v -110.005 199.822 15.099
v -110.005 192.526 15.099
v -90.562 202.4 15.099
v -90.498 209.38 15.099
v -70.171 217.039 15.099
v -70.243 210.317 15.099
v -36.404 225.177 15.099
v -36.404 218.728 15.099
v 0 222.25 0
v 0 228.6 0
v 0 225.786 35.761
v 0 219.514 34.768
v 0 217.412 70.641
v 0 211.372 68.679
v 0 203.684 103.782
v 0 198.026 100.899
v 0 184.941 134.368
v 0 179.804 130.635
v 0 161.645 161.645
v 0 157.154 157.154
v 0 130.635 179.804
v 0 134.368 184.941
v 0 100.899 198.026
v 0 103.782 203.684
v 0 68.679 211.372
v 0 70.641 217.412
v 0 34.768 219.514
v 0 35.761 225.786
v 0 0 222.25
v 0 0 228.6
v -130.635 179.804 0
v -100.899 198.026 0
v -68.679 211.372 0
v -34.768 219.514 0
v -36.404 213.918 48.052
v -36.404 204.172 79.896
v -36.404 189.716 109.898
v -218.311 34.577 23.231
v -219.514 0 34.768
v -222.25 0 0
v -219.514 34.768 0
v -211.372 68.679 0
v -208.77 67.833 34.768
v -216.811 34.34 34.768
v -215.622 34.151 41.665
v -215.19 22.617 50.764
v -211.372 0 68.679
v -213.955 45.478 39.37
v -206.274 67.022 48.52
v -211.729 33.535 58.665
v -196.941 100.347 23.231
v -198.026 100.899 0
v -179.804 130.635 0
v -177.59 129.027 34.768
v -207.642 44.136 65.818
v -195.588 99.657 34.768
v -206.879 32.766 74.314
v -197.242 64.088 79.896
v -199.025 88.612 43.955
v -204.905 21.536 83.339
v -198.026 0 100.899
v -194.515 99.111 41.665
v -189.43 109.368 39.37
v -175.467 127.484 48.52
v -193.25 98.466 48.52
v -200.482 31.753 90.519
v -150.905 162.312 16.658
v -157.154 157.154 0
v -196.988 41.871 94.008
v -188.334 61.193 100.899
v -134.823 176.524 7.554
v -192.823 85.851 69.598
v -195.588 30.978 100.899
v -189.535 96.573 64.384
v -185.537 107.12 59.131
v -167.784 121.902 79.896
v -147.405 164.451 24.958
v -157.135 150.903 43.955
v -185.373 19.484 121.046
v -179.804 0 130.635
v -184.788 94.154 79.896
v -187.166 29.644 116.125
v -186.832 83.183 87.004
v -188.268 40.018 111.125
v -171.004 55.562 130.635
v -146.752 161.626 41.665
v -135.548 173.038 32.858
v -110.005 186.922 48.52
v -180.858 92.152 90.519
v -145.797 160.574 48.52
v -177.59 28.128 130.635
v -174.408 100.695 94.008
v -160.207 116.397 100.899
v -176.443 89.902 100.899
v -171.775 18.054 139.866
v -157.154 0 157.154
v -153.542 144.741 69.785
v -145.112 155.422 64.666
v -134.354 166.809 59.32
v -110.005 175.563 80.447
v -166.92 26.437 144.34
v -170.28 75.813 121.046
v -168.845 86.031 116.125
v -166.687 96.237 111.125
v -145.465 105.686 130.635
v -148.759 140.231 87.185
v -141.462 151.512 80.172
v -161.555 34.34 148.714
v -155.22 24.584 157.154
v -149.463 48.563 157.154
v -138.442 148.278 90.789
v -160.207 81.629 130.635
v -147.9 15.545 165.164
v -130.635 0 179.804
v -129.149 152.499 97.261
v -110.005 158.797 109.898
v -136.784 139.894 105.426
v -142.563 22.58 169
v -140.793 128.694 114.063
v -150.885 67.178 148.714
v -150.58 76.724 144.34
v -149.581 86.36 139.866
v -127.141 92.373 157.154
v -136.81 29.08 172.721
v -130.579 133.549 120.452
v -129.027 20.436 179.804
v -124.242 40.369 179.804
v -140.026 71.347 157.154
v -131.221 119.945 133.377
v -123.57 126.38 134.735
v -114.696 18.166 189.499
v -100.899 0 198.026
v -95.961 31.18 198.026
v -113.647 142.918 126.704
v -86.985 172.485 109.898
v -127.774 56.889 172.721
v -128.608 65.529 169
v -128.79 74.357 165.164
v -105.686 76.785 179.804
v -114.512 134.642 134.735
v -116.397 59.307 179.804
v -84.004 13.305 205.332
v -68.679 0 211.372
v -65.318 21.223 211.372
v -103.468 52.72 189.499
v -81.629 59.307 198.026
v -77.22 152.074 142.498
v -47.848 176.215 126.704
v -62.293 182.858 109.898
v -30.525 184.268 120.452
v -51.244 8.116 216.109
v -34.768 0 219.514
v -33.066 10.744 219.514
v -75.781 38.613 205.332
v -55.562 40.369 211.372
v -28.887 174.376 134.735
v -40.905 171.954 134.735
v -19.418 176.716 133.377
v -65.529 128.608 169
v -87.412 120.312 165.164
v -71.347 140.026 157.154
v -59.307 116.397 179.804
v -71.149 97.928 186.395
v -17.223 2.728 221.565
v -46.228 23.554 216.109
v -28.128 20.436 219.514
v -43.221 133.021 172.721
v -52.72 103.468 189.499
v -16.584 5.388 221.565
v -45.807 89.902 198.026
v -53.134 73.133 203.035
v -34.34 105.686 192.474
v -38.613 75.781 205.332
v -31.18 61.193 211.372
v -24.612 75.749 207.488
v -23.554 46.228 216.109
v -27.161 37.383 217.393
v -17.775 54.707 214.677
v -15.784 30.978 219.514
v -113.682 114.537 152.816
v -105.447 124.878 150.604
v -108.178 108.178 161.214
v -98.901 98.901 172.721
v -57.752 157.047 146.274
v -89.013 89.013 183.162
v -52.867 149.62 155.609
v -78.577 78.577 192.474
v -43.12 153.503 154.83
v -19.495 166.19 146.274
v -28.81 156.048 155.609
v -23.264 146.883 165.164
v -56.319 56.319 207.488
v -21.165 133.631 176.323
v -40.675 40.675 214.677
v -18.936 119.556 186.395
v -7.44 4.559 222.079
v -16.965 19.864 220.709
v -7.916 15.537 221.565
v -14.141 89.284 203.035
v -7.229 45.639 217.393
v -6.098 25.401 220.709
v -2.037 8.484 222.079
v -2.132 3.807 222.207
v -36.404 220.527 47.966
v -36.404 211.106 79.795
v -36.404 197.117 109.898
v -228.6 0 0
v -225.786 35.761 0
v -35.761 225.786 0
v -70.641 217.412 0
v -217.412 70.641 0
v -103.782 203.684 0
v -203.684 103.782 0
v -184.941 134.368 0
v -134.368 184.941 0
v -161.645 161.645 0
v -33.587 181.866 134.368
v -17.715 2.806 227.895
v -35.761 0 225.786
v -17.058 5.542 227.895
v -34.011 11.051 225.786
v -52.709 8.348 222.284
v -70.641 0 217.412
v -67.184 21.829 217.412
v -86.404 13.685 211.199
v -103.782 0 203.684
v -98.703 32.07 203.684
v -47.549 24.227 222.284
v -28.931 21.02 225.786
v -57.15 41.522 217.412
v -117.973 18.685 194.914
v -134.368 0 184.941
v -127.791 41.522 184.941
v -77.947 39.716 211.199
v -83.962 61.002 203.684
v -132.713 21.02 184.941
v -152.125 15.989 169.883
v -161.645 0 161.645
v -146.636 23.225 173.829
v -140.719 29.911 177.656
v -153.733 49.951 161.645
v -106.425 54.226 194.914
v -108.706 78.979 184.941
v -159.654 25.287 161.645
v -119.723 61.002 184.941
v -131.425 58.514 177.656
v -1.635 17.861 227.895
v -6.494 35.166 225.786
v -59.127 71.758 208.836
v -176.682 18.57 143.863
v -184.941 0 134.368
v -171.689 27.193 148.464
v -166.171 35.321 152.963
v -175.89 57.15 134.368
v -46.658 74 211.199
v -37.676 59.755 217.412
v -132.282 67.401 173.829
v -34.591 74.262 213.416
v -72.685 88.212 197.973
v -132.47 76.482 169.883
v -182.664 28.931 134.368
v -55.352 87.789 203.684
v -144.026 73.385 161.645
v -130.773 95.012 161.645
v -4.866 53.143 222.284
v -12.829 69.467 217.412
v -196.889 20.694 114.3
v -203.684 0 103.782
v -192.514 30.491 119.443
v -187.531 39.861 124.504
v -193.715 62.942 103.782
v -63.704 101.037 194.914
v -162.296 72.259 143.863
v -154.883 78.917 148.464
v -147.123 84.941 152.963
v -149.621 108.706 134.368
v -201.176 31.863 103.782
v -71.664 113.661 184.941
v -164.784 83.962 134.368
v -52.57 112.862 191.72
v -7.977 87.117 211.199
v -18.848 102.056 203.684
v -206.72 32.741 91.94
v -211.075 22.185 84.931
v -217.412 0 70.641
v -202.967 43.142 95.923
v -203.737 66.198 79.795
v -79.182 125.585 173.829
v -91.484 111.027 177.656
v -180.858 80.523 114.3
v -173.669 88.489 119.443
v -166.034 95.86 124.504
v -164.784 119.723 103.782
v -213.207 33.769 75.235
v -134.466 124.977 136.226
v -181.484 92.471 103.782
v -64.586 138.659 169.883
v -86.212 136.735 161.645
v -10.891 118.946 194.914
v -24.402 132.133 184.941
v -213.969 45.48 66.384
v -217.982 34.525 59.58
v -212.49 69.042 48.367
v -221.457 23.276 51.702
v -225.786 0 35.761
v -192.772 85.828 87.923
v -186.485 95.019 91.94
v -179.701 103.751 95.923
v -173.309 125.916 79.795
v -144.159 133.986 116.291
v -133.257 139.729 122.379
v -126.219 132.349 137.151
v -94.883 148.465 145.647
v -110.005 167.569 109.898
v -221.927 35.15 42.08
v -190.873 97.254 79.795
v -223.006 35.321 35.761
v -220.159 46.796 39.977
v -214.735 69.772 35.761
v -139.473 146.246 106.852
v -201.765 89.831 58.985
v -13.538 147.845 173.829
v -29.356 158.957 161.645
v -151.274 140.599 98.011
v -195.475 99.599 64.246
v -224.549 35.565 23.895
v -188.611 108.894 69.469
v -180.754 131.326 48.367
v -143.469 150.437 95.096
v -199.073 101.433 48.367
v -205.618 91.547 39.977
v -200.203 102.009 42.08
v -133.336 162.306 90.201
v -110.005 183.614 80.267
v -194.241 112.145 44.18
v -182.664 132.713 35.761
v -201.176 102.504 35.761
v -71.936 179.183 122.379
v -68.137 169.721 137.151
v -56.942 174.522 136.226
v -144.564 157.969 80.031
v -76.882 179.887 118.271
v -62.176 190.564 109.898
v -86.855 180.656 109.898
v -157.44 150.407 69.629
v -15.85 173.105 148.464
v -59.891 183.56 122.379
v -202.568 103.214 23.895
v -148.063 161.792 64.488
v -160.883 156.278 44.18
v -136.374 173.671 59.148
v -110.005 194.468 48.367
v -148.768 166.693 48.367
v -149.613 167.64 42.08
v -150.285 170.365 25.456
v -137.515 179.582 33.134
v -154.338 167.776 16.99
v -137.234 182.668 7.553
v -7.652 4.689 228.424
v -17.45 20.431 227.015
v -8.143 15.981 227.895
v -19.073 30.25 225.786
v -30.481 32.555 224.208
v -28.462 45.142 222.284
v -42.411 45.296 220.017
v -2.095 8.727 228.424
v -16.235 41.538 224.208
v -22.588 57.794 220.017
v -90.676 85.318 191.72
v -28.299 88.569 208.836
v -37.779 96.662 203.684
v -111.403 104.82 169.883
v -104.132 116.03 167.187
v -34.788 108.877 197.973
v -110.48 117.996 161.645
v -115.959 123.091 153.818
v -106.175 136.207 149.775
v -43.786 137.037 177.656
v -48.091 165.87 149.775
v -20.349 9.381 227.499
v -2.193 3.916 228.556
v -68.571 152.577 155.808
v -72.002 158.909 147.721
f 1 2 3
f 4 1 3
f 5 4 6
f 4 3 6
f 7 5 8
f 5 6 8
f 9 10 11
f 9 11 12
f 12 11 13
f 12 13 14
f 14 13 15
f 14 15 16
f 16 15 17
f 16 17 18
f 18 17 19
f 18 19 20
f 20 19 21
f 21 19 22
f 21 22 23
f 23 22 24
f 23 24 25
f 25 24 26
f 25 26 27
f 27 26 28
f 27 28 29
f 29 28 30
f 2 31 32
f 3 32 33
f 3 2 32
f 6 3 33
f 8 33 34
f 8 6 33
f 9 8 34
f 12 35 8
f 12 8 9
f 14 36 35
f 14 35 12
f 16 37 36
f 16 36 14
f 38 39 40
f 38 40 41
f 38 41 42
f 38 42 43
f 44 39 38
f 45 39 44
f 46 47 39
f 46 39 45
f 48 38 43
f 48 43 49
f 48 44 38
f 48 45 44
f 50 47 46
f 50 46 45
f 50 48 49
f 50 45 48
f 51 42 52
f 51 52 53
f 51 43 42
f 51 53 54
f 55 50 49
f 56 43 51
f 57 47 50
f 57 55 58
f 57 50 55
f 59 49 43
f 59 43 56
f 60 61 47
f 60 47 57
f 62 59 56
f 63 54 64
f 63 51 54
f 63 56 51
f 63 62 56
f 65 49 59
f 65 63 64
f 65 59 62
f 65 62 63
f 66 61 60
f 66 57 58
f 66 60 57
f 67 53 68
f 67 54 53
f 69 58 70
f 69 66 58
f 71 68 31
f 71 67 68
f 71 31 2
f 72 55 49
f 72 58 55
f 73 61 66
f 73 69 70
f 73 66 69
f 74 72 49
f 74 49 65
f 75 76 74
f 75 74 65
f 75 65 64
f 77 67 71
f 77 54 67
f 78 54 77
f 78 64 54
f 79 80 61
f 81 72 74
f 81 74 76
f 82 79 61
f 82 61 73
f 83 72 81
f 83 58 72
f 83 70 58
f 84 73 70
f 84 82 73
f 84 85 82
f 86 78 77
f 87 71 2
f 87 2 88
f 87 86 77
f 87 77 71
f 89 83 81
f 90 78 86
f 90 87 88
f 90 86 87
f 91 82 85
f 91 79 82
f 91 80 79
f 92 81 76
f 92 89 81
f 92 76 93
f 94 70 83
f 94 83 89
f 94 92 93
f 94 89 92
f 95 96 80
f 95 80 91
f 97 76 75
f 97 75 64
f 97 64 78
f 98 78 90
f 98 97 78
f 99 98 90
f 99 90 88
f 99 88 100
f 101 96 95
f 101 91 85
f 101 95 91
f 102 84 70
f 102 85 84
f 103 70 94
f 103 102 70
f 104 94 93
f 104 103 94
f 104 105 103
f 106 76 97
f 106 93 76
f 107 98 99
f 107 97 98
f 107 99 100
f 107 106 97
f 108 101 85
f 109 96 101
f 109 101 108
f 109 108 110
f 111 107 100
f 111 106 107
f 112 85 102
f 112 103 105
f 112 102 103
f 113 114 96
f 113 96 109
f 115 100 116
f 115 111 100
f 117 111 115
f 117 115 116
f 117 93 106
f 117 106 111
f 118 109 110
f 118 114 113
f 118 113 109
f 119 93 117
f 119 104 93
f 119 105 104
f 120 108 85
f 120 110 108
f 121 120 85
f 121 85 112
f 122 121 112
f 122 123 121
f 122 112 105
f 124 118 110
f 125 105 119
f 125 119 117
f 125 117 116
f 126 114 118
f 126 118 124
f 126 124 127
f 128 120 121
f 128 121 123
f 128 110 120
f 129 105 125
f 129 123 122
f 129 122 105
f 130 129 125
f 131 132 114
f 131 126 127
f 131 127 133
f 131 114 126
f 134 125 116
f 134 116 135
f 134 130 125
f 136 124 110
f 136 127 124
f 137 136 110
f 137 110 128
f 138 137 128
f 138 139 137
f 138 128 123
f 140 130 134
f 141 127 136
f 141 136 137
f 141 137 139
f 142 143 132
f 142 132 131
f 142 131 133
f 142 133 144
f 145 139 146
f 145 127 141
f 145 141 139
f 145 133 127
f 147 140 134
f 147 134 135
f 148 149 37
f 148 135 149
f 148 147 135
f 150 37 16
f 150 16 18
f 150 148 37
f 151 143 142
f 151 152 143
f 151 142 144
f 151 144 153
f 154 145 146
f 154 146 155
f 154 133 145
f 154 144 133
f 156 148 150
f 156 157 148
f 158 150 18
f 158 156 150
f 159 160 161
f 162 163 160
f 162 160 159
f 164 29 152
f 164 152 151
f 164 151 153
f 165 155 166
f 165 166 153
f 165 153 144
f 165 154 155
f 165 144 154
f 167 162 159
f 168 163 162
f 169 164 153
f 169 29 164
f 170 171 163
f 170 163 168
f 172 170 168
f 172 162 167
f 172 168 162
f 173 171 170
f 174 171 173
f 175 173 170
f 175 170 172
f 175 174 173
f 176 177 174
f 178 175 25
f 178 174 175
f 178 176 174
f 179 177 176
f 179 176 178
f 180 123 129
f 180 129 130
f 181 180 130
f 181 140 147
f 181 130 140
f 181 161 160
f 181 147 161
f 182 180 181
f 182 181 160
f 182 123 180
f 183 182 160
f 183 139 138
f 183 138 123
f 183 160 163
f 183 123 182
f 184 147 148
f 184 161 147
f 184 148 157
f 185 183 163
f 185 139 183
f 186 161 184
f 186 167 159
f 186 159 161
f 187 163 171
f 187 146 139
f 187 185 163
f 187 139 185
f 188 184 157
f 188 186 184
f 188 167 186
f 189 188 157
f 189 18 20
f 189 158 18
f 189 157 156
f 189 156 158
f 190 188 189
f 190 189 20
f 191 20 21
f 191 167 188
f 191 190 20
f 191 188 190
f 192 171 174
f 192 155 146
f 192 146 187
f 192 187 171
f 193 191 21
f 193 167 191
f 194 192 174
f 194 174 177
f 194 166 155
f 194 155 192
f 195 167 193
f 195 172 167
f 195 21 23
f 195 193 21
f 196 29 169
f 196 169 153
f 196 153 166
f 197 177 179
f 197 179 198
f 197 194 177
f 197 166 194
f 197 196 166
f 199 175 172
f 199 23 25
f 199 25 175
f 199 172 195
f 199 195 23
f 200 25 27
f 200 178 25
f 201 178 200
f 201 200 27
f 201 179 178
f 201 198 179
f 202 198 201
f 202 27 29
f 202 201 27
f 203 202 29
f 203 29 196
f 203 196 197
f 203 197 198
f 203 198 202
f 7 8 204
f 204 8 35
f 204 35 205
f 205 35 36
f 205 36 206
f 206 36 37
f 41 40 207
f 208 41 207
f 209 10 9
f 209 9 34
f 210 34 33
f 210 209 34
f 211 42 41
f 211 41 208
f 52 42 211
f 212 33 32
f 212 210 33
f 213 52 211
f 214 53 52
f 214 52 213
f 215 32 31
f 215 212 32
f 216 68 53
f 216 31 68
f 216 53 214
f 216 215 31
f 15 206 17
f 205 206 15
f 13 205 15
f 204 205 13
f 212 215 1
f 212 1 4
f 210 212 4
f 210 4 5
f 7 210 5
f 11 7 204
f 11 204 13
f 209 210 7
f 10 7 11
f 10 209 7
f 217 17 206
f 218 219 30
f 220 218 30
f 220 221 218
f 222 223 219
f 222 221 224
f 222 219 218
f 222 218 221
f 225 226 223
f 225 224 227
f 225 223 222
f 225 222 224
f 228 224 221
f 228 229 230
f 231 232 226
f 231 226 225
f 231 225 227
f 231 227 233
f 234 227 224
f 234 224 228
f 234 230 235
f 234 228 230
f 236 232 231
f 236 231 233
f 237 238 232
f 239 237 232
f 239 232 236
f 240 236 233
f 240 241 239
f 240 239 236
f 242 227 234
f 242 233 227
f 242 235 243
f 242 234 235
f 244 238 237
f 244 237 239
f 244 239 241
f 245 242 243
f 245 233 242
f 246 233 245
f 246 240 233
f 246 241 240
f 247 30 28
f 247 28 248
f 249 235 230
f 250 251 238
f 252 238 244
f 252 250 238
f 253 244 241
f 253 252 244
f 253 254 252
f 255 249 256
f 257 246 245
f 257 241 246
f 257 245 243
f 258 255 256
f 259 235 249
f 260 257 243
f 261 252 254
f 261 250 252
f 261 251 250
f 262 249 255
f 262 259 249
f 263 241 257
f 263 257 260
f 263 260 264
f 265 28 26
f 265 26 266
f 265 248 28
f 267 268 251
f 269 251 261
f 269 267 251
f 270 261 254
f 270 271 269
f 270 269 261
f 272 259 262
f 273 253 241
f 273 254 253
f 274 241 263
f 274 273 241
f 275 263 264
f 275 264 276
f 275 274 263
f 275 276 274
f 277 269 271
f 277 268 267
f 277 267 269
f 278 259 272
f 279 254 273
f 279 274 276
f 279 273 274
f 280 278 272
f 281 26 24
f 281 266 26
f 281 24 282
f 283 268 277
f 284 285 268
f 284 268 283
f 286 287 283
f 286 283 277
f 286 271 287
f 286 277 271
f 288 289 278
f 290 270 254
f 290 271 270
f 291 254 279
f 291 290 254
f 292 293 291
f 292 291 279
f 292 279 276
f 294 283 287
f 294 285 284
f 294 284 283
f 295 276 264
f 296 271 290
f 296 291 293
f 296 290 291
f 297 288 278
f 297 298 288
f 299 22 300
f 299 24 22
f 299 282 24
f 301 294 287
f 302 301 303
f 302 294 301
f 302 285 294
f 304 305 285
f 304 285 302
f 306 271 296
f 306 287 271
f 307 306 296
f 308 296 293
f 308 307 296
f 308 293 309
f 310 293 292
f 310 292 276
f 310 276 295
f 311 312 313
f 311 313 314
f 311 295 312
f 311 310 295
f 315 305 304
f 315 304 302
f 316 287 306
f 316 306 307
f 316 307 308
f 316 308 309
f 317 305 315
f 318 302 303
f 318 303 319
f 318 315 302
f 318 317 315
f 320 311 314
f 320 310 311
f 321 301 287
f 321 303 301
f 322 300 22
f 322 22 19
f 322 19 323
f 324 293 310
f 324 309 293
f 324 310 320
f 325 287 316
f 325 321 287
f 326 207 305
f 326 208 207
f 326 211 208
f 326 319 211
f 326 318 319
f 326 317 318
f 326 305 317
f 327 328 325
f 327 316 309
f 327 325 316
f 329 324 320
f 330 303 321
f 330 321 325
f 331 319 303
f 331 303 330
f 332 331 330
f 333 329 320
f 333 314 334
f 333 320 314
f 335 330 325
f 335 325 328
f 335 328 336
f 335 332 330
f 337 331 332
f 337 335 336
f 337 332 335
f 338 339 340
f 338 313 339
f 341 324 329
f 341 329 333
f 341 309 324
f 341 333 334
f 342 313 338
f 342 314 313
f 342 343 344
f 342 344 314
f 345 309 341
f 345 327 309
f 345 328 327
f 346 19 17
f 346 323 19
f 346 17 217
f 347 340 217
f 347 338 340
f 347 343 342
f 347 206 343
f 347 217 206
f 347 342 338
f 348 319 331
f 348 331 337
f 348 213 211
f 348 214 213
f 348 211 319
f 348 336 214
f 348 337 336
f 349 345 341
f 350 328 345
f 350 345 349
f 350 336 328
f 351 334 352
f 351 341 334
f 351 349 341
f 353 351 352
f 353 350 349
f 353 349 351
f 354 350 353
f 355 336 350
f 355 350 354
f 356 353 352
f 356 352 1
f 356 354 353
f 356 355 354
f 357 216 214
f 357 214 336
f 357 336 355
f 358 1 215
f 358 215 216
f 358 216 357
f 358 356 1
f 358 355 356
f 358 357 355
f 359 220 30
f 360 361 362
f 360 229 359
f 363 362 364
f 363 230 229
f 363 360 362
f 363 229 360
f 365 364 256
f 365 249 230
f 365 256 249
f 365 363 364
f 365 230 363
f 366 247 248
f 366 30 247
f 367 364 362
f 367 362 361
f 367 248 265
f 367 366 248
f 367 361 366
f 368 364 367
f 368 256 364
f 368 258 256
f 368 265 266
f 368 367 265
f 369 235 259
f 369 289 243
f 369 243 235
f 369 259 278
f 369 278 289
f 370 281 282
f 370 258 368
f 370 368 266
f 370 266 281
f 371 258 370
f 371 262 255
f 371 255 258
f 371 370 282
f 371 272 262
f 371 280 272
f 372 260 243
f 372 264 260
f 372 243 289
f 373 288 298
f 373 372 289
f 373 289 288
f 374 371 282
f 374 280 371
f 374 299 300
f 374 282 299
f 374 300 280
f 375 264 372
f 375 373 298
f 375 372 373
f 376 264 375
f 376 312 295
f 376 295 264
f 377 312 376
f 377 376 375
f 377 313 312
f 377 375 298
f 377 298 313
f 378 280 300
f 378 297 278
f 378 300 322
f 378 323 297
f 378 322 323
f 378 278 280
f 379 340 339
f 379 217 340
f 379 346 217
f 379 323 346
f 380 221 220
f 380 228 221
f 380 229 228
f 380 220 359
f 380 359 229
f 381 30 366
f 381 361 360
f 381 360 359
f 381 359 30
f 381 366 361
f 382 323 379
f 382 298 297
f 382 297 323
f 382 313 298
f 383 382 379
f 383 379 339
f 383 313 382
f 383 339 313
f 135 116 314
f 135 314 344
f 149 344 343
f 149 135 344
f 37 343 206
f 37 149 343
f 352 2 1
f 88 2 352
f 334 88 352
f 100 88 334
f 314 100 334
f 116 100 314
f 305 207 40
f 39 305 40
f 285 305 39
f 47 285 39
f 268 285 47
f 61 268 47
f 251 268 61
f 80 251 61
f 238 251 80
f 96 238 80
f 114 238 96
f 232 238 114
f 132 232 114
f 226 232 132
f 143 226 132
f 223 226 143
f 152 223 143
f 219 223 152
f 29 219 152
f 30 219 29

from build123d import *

# Parameters (mm, degrees)
F1_ANGLE = 90
F2_W     = 73.601034
F2_H     = 94.799207
F3_DEPTH = 285.242


with BuildPart() as f1:
    # F0 (on Front) → F1 (revolve)
    with BuildSketch(Plane.XZ):
        with BuildLine():
            Line((0, 222.25), (0, 228.6))
            ThreePointArc((0, 228.6), (-161.64461, 161.64461), (-228.6, 0))
            Line((-228.6, 0), (-222.25, 0))
            ThreePointArc((-222.25, 0), (-157.154482, 157.154482), (0, 222.25))
        make_face()
    revolve(axis=Axis((0, 0, 114.3), (0, 0, -1)), revolution_arc=F1_ANGLE)

    # F2 (on Front) → F3 (cut)
    with BuildSketch(Plane.XZ):
        with Locations((-73.204072, 62.498218)):
            Rectangle(F2_W, F2_H)
    extrude(amount=-F3_DEPTH, mode=Mode.SUBTRACT)


solid = f1.part
